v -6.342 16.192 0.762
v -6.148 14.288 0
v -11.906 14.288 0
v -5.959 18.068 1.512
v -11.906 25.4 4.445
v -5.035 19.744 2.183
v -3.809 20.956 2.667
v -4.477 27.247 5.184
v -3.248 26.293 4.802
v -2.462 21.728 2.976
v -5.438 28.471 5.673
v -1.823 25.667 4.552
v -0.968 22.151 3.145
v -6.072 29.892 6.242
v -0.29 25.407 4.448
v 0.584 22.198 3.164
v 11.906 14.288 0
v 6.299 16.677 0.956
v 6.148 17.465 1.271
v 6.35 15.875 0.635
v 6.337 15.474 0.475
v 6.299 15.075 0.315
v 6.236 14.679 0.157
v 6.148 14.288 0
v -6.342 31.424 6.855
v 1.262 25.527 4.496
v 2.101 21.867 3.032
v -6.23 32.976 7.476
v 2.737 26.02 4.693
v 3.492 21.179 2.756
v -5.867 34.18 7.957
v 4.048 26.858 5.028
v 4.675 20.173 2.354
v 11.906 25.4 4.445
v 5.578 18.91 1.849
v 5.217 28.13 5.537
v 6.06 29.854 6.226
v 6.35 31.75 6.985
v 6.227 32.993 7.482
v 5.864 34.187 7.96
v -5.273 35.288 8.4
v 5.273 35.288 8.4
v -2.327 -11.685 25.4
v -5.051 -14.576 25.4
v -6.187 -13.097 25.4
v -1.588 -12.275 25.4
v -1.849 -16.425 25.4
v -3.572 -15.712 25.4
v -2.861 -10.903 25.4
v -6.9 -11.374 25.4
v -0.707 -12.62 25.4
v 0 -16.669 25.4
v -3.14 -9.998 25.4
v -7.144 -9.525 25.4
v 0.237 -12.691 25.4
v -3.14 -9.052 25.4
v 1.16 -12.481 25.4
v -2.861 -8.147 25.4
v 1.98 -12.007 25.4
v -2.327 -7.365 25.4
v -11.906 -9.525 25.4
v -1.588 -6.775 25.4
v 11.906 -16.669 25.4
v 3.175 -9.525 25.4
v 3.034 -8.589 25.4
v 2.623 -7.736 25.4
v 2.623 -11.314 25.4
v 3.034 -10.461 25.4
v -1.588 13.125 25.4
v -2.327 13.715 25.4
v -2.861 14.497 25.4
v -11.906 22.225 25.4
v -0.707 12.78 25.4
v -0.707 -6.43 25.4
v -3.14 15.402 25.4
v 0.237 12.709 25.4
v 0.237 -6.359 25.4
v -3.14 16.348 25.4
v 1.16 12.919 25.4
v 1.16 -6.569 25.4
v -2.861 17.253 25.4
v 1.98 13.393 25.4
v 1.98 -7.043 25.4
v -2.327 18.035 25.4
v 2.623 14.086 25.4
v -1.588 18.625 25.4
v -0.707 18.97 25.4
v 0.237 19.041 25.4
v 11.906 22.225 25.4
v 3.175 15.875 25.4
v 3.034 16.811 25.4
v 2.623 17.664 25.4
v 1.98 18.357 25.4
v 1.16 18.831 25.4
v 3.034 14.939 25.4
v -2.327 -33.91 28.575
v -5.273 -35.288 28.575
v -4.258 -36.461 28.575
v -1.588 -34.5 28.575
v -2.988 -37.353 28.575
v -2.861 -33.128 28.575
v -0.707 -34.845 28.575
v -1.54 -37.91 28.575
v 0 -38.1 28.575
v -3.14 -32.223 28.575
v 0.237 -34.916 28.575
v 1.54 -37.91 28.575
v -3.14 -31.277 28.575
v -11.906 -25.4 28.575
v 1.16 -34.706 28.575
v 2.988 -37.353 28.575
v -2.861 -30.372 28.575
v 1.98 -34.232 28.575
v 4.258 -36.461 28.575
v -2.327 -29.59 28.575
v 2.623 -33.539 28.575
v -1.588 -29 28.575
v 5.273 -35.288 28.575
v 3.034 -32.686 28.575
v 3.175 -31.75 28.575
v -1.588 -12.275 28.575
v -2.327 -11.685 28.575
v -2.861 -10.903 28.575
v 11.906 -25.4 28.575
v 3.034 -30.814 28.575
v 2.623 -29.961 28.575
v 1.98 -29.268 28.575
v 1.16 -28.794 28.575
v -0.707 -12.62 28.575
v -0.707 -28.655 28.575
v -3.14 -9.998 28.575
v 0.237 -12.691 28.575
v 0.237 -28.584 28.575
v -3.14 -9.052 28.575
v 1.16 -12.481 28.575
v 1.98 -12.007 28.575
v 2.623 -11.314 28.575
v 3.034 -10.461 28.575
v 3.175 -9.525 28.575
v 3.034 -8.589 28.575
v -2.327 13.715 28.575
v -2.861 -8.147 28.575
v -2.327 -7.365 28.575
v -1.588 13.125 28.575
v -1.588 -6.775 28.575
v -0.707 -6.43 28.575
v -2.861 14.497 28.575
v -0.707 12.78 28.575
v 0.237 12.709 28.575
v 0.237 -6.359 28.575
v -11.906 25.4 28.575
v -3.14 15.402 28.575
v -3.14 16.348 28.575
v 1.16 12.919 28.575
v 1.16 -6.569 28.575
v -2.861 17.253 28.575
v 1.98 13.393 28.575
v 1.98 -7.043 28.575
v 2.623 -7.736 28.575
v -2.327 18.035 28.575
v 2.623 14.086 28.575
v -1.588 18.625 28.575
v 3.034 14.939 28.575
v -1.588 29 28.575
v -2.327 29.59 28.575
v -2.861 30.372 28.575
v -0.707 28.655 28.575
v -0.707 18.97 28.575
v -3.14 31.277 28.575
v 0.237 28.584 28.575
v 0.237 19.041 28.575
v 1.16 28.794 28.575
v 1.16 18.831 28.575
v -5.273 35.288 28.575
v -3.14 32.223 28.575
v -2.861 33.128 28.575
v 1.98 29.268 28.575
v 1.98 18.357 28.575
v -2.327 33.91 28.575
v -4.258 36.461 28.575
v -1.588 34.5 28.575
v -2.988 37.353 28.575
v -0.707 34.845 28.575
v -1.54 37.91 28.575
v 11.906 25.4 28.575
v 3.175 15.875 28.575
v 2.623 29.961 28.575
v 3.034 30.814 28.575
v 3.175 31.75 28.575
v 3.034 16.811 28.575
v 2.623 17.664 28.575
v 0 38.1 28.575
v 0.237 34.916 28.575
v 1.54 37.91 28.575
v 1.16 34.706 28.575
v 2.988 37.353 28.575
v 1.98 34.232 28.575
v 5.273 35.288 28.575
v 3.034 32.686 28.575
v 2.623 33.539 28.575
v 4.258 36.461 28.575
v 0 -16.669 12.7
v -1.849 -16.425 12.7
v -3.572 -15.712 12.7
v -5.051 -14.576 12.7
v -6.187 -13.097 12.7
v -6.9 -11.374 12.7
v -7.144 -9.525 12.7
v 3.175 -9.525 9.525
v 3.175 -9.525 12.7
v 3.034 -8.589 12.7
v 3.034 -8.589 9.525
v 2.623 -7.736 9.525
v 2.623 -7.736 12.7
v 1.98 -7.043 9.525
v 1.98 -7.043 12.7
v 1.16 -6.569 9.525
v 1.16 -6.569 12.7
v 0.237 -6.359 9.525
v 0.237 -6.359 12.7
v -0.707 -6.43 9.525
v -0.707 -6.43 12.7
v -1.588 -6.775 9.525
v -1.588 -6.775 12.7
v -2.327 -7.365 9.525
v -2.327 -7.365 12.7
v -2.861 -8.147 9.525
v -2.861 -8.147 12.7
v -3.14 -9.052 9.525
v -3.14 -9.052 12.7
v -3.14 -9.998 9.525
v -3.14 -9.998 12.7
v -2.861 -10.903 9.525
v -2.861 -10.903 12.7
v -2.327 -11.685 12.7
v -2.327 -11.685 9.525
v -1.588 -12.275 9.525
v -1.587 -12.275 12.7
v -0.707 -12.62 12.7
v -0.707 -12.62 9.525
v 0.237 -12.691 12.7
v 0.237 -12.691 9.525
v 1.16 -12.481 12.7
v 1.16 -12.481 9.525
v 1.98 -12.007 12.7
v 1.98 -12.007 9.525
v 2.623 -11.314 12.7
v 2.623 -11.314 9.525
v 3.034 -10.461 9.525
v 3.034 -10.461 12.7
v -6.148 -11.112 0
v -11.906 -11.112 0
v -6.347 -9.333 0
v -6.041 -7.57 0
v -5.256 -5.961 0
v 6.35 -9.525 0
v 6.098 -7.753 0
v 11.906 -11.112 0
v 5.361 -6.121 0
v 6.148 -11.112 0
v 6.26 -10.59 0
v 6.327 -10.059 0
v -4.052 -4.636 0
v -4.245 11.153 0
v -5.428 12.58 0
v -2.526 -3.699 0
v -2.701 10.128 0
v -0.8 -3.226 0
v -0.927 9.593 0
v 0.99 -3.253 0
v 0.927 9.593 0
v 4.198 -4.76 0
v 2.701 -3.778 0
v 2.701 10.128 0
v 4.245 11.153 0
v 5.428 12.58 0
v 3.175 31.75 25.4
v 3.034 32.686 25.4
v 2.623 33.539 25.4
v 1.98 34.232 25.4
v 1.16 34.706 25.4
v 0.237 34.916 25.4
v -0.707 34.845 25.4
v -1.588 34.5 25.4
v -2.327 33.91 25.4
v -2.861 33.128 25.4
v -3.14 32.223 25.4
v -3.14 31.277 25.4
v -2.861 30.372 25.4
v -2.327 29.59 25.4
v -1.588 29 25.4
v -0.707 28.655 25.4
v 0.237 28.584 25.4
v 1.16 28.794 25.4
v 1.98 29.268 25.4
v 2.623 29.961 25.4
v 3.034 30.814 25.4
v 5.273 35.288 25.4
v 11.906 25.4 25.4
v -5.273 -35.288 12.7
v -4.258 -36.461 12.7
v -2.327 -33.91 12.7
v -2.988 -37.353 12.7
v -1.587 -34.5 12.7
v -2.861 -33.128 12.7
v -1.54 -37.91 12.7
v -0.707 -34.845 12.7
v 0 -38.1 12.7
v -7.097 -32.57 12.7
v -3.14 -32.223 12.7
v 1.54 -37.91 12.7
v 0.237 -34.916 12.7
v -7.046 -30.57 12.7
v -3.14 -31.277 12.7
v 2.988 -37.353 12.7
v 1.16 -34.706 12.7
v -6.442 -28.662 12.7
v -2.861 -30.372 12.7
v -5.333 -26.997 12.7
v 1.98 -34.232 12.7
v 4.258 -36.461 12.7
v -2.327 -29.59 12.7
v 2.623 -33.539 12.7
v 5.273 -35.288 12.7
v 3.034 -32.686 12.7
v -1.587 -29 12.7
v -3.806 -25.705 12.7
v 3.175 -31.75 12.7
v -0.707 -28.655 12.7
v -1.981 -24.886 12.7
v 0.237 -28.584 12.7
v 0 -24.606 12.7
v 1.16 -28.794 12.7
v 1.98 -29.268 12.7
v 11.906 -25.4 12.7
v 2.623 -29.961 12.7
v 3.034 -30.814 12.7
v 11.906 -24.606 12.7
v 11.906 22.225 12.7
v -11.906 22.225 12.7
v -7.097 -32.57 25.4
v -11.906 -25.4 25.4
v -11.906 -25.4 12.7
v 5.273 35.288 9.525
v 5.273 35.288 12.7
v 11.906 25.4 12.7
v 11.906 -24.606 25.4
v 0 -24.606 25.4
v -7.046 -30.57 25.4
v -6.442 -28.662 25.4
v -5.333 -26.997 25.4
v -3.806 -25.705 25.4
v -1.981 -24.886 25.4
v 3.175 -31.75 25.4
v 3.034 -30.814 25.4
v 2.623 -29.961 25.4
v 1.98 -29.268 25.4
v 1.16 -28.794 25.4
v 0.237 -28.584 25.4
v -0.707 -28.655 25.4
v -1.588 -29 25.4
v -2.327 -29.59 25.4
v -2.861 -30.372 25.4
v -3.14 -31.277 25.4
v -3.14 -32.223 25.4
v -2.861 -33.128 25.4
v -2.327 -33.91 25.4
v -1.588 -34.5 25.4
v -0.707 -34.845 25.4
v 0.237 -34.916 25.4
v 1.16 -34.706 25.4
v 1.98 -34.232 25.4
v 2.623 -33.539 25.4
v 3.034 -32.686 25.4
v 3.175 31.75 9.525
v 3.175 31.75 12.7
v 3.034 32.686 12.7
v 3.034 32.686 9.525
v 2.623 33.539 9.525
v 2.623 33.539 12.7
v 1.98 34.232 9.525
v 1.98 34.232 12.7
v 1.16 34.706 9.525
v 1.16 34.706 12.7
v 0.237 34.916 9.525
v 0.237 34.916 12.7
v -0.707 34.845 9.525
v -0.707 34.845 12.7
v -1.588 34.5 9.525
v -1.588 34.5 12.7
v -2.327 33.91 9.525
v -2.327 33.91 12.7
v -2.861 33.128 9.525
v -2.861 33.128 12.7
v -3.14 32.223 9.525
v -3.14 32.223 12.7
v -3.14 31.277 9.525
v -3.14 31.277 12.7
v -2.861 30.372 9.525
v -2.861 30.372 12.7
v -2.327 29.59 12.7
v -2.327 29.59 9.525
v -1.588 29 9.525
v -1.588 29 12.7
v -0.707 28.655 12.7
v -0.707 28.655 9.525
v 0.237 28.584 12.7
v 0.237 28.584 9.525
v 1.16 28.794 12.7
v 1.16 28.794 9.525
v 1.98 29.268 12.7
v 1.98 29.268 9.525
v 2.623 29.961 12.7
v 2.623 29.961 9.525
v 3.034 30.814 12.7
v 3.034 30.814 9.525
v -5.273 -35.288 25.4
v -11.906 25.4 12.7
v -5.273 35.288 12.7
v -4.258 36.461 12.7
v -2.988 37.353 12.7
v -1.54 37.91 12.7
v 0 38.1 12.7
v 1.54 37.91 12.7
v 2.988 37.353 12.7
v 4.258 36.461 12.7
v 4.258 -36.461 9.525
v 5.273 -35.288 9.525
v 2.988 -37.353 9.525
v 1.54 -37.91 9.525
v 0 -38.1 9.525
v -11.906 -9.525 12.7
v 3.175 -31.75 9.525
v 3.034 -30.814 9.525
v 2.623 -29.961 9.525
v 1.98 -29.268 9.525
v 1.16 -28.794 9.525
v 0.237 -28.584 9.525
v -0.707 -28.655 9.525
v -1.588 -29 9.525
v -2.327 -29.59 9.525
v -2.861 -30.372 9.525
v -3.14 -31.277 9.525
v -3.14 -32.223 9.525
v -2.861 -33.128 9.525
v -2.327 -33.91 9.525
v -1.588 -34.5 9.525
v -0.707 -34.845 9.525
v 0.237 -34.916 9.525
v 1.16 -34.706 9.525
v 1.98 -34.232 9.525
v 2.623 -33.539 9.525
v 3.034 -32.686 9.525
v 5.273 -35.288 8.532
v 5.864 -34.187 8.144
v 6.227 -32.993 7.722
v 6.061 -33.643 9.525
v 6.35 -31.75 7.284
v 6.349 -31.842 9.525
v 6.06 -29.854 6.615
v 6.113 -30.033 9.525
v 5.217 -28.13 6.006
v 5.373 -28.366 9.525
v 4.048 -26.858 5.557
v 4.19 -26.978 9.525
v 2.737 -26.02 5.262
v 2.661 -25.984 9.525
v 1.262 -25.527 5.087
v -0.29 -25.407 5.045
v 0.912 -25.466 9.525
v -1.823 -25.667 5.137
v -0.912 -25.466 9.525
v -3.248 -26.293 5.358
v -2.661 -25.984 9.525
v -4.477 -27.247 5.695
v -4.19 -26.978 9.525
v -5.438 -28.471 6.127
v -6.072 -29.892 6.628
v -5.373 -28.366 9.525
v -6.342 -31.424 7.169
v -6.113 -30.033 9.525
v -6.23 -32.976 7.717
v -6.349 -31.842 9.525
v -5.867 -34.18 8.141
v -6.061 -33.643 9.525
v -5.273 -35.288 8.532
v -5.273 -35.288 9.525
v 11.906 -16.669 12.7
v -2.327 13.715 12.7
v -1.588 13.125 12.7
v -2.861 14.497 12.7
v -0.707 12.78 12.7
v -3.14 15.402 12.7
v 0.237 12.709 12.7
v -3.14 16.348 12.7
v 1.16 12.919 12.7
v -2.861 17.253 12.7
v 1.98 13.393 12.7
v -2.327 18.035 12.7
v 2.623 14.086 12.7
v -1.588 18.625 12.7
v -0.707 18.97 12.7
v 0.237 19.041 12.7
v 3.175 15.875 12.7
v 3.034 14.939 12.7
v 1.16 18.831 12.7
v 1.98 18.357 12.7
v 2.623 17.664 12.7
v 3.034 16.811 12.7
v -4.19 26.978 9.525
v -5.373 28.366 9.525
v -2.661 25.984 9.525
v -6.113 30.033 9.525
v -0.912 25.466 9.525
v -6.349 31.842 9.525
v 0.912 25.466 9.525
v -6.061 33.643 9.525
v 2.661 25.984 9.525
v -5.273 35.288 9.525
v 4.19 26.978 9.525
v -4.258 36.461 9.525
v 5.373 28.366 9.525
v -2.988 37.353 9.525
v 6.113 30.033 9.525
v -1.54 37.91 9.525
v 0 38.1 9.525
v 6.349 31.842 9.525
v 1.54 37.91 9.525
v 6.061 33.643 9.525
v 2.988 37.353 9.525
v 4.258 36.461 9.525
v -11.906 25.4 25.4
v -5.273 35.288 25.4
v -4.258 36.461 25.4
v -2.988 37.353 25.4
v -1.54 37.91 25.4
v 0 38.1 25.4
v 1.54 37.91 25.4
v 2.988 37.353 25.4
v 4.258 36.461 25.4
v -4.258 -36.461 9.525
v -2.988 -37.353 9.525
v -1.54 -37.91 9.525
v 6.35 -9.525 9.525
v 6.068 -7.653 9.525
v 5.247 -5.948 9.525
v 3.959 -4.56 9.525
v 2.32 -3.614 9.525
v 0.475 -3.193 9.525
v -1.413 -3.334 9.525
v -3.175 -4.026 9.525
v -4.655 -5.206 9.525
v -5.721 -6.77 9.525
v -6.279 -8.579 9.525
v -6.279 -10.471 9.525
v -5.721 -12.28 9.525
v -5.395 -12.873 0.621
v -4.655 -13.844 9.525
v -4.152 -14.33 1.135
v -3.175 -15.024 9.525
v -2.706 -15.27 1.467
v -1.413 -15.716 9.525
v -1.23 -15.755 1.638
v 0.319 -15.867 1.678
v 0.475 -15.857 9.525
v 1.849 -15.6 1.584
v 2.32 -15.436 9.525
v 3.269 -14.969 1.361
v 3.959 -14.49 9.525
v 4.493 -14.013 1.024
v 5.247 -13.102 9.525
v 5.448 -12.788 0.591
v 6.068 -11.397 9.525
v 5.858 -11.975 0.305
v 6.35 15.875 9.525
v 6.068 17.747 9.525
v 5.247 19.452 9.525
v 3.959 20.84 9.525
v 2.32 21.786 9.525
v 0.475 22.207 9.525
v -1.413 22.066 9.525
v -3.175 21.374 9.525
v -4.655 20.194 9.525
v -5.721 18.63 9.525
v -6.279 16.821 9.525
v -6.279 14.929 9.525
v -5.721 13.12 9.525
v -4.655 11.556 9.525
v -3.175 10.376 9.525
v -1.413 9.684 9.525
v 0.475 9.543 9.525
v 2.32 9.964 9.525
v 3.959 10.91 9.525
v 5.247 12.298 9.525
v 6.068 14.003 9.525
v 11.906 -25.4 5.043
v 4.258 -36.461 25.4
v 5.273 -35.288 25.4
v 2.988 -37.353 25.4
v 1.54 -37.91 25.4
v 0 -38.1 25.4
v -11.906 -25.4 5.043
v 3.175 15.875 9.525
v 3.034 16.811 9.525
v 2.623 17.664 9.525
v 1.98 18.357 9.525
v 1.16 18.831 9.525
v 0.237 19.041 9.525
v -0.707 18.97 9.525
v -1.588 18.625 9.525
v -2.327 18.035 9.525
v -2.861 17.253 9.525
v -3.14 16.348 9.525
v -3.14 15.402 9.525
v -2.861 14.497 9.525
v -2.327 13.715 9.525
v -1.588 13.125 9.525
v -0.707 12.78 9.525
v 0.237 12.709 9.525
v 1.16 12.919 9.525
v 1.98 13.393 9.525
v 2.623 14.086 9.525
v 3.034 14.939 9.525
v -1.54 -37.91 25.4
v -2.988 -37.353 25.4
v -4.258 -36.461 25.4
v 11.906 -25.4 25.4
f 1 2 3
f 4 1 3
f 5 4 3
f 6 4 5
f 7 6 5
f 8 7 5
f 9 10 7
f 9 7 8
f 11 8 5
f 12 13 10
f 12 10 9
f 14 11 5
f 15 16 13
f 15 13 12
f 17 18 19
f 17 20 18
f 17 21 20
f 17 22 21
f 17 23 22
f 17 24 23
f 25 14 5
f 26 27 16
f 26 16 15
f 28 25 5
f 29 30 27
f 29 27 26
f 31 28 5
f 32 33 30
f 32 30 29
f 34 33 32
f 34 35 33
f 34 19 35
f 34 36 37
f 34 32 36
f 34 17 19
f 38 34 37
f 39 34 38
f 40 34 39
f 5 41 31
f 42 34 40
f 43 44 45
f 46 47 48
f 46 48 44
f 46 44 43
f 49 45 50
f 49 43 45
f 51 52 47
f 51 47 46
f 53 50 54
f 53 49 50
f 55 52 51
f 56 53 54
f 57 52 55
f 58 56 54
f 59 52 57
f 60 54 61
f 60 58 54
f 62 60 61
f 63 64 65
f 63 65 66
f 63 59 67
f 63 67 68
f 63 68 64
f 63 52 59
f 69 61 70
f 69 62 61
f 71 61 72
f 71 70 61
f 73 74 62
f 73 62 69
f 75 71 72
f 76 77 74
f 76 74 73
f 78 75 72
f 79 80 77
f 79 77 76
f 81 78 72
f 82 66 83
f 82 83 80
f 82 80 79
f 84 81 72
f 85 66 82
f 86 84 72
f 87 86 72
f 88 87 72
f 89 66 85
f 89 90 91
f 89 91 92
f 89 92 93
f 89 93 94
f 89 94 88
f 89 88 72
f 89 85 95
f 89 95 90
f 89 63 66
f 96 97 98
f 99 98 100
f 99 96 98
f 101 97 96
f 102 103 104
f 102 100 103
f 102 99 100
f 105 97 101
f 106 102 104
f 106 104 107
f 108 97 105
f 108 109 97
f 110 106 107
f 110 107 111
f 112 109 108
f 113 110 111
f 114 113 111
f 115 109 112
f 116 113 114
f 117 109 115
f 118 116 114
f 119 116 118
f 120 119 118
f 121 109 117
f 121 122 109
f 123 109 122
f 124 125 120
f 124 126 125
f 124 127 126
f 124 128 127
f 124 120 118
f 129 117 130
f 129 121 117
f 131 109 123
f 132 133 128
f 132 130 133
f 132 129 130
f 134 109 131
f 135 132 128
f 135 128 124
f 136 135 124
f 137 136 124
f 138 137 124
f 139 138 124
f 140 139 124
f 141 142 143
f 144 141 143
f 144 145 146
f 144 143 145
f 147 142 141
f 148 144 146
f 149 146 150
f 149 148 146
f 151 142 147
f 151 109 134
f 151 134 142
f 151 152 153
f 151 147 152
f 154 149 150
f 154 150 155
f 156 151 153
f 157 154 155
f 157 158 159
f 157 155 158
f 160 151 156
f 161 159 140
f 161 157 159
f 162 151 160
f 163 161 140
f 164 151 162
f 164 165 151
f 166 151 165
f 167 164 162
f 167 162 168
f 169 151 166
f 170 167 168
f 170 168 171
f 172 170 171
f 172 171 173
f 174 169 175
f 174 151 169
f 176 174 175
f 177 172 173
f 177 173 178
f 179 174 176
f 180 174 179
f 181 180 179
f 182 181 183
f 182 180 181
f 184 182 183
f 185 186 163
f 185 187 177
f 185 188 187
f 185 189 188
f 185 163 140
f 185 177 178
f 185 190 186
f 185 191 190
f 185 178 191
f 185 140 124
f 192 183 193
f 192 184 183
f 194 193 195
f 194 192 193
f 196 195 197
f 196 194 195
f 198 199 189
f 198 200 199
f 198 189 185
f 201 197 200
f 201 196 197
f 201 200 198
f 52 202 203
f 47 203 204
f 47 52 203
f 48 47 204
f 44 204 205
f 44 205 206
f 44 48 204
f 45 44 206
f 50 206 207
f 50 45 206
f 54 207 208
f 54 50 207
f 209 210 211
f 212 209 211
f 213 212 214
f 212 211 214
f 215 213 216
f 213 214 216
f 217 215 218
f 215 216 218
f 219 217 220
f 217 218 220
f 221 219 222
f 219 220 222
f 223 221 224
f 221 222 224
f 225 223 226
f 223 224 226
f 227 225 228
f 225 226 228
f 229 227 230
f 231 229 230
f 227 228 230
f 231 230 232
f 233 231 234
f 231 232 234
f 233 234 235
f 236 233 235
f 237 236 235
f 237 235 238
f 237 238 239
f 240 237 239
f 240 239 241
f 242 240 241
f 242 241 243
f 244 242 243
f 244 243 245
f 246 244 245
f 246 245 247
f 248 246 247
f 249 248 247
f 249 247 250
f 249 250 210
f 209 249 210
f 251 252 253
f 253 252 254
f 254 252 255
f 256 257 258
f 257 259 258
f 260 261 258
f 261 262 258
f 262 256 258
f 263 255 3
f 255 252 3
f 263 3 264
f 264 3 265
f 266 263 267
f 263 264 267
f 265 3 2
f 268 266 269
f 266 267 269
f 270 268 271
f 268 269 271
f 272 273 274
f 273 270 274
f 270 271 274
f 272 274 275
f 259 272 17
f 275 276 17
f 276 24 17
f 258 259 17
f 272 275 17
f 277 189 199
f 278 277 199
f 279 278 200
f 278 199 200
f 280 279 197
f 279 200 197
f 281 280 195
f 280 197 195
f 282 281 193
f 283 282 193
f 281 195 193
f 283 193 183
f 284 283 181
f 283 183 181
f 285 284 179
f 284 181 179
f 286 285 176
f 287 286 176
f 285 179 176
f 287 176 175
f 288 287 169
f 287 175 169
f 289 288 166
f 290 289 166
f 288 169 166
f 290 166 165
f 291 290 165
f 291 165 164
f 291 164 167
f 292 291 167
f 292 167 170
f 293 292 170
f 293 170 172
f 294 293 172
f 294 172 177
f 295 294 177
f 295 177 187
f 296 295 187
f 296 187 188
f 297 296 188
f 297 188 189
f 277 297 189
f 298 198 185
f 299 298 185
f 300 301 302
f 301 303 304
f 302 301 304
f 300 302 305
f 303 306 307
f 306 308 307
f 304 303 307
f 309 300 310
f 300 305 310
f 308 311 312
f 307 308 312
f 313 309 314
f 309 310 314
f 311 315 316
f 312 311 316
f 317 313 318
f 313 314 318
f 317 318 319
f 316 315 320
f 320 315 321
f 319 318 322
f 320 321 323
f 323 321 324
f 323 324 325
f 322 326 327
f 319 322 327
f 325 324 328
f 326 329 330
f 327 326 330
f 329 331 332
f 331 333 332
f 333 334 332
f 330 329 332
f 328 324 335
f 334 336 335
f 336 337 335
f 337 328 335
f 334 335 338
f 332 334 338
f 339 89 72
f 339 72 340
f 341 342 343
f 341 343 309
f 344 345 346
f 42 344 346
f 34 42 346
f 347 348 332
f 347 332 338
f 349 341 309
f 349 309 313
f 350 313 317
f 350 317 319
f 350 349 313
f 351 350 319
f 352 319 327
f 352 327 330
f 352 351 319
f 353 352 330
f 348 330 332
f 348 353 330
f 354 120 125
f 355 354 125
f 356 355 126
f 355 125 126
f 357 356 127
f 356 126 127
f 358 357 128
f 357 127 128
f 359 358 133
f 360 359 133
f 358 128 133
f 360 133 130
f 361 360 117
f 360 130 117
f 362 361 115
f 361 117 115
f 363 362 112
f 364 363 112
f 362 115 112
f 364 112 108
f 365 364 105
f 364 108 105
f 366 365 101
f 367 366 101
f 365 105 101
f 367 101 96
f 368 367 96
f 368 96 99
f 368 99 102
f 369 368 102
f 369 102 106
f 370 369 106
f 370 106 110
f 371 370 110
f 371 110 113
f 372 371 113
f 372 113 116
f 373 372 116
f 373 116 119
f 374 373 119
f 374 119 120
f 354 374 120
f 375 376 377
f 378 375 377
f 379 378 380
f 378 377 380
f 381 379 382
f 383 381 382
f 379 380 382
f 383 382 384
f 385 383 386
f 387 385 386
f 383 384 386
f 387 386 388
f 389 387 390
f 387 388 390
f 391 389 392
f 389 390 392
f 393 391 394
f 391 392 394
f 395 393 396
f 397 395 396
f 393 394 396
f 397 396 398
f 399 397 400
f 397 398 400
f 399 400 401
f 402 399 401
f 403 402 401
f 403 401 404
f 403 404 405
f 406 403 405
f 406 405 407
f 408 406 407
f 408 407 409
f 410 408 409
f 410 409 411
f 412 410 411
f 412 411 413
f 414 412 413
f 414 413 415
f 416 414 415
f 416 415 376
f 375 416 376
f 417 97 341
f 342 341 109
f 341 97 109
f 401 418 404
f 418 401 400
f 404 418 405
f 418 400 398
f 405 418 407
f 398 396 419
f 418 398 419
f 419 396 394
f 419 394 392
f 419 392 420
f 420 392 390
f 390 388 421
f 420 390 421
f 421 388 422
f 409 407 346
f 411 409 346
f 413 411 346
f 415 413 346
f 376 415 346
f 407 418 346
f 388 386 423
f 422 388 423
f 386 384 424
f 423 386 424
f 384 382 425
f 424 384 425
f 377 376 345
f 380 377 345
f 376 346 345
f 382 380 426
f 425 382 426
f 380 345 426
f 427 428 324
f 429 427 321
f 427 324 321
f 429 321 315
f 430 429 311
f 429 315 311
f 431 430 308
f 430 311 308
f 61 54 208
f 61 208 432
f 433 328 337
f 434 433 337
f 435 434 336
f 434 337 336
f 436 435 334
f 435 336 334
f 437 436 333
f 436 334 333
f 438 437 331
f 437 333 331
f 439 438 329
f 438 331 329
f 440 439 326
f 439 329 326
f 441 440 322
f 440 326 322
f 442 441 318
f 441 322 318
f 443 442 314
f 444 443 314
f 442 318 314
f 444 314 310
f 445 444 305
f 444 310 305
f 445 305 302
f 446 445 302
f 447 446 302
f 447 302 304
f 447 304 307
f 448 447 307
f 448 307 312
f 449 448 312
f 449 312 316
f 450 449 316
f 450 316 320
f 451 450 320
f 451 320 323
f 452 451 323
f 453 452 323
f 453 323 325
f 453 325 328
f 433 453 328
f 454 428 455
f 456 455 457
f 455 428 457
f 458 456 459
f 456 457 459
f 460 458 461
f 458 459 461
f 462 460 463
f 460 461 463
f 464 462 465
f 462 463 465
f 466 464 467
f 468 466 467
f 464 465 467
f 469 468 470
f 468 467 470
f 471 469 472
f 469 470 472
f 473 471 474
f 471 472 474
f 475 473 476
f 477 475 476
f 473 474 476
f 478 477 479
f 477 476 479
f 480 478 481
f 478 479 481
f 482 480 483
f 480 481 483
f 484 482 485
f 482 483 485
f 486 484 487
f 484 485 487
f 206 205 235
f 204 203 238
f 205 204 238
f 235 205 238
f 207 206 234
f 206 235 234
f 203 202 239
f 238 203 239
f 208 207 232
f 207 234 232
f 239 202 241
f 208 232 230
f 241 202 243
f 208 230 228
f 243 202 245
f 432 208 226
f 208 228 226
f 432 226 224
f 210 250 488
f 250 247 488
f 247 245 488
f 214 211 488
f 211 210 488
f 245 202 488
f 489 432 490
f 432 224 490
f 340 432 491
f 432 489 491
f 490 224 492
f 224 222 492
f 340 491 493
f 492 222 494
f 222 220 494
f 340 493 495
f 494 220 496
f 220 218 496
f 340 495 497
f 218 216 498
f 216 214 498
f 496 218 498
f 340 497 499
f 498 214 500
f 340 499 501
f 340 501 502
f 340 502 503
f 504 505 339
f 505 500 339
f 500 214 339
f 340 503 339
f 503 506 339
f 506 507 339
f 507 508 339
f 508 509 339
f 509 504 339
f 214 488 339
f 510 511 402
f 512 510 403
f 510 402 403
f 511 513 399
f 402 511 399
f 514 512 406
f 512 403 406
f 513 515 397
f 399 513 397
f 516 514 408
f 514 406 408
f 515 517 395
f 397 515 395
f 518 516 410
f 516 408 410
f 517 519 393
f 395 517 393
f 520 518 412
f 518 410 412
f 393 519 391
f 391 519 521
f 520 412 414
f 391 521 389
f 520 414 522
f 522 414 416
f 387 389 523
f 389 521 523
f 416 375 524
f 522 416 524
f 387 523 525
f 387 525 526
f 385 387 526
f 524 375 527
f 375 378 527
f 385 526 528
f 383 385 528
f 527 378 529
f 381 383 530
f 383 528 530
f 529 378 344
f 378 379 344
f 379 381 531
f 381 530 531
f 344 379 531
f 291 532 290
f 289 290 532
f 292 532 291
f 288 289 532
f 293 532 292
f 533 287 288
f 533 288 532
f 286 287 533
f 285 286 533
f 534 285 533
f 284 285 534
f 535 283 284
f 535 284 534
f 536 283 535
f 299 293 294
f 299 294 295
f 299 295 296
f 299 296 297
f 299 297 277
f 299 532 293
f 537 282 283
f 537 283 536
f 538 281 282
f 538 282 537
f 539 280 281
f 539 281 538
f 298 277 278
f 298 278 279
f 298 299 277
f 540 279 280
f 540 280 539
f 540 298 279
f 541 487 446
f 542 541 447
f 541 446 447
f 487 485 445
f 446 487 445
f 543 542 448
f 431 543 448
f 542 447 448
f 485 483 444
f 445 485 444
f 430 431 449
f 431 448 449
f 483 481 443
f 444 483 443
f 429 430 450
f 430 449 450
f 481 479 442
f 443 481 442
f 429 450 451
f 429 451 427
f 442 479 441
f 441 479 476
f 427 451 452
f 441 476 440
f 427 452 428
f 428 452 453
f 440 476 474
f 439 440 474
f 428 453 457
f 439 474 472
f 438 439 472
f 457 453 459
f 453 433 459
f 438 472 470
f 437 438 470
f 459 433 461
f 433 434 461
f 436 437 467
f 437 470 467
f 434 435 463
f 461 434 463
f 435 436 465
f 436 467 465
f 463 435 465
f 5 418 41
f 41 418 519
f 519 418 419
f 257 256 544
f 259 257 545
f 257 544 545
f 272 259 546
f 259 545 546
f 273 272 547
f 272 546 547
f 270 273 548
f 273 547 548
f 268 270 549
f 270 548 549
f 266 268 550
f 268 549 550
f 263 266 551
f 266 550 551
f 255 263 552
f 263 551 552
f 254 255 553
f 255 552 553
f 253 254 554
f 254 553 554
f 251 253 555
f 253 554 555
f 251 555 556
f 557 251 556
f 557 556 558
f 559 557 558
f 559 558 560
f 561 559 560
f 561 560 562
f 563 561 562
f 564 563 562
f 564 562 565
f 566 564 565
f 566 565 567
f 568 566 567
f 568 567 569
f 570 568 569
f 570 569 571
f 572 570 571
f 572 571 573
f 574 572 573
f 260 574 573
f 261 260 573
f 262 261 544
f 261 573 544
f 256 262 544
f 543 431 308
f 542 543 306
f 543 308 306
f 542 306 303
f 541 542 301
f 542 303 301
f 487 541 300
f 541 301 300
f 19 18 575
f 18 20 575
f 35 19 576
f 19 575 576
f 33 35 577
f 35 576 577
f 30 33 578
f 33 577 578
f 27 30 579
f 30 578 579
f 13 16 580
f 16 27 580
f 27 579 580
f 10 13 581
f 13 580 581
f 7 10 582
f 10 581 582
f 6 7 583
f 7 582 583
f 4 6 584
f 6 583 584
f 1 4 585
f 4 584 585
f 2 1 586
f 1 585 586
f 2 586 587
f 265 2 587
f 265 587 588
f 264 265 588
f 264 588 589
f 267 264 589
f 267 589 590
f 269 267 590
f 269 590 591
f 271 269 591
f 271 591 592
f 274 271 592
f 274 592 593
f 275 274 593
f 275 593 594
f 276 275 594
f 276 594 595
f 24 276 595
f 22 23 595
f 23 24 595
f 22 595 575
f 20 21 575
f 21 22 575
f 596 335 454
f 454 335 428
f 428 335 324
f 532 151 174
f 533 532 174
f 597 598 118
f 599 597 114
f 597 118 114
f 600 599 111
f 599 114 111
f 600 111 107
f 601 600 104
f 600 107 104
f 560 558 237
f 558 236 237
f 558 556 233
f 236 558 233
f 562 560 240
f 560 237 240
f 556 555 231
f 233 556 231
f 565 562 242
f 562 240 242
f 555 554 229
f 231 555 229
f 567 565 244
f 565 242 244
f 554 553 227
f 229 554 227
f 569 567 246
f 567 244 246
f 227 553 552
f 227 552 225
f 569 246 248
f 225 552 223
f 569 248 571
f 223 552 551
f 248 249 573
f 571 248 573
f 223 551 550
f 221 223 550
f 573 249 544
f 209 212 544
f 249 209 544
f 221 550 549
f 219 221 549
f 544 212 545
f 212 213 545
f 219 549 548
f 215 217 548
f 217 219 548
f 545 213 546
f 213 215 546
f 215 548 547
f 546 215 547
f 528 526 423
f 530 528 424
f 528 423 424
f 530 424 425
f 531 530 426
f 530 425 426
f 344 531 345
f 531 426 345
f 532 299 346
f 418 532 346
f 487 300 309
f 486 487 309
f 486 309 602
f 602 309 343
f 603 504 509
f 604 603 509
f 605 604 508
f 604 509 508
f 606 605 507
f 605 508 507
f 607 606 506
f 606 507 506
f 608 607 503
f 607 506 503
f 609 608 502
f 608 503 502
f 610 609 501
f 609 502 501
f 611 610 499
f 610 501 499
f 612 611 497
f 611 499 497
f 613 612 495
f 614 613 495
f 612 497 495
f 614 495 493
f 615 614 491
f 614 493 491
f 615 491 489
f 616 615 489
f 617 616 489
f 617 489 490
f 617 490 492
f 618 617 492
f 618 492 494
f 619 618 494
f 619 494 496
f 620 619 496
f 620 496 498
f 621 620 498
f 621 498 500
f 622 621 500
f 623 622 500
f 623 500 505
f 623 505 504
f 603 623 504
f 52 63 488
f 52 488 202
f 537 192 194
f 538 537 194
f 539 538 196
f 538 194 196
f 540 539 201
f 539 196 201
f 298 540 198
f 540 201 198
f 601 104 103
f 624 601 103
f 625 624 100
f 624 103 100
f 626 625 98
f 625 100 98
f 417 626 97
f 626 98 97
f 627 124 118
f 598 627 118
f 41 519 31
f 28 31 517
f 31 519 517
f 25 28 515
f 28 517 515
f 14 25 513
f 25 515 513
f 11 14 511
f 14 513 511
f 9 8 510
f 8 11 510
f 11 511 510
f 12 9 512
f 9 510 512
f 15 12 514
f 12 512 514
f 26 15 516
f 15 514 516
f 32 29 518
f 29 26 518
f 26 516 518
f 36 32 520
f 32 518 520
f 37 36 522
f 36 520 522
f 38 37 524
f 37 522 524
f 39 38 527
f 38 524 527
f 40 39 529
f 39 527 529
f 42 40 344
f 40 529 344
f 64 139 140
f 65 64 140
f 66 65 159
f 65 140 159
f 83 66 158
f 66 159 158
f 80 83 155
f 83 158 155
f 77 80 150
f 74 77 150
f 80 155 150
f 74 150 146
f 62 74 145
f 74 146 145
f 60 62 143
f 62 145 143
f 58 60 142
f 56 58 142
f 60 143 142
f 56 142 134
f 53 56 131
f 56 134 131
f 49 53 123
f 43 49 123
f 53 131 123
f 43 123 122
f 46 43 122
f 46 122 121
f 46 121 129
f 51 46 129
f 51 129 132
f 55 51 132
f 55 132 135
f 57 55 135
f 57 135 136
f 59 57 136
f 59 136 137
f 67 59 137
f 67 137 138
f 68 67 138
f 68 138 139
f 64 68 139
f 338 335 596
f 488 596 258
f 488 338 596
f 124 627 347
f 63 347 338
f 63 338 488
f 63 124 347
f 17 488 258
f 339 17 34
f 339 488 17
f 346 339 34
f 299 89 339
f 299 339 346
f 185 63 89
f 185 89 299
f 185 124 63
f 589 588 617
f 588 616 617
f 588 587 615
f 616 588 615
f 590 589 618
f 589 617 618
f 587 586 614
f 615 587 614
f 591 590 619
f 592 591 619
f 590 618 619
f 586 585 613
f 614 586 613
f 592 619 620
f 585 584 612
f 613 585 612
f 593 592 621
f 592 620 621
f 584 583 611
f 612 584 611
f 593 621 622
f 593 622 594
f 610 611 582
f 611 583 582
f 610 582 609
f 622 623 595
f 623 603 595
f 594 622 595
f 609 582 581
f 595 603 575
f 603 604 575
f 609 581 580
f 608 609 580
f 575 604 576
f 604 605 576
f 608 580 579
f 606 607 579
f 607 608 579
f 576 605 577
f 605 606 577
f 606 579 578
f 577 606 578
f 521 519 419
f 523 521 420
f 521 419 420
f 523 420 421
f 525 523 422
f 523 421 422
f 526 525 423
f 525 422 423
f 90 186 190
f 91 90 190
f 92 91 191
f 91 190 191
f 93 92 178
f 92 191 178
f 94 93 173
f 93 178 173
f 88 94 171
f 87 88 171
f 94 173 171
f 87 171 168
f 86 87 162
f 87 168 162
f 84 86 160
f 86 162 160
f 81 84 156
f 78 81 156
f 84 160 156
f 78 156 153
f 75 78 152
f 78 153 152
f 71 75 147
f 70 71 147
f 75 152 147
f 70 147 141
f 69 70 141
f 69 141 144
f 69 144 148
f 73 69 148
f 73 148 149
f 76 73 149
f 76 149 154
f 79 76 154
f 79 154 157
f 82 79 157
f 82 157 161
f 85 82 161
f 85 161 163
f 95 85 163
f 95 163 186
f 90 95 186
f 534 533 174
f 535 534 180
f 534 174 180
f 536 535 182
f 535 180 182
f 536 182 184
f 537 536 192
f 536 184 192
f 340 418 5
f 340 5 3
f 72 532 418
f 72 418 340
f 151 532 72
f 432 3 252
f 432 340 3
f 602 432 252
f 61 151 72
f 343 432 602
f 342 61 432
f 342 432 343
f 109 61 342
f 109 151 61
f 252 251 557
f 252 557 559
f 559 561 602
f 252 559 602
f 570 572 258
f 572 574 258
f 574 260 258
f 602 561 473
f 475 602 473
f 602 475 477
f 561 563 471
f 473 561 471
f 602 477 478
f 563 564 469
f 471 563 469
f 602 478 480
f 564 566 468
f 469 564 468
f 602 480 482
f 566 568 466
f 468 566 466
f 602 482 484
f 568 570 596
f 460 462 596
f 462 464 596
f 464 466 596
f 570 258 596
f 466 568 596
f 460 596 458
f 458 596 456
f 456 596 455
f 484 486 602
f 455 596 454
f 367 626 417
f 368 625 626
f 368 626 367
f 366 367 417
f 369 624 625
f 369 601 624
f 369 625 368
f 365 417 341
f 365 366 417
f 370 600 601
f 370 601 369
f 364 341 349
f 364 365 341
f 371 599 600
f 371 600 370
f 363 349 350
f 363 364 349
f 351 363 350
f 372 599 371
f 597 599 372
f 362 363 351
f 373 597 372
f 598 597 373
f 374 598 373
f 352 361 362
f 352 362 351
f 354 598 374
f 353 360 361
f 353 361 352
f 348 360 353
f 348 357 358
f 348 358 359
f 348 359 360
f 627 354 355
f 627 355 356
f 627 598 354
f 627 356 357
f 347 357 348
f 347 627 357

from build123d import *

# Parameters (mm, degrees)
SKETCH1_W               = 23.8125
SKETCH1_H               = 76.2
BOSS_EXTRUDE1_DEPTH     = 28.575
SKETCH2_R               = 3.175
CUT_EXTRUDE1_DEPTH      = 31.75
SKETCH11_W              = 12.7
SKETCH11_H              = 12.7
SKETCH11_H_2            = 60.325
CUT_EXTRUDE7_DEPTH      = 12.90625
CUT_EXTRUDE7_DEPTH_BACK = 12.90625
BOSS_EXTRUDE3_DEPTH     = 12.7
CUT_EXTRUDE8_START      = -3.175
SKETCH13_R              = 6.35
CUT_EXTRUDE8_DEPTH      = 10.525


with BuildPart() as part:
    # Sketch1 → Boss-Extrude1 (new body)
    with BuildSketch(Plane.XY):
        Rectangle(SKETCH1_W, SKETCH1_H)
    extrude(amount=BOSS_EXTRUDE1_DEPTH)

    # Sketch2 → Cut-Extrude1 (cut)
    with BuildSketch(Plane.XY.offset(28.575)):
        with BuildLine():
            Line((-11.90625, -38.1), (0, -38.1))
            ThreePointArc((0, -38.1), (-2.988235294, -37.352941176), (-5.273356401, -35.287543253))
            Line((-5.273356401, -35.287543253), (-11.90625, -25.4))
            Line((-11.90625, -25.4), (-11.90625, -38.1))
        make_face()
        with BuildLine():
            Line((11.90625, -38.1), (11.90625, -25.4))
            Line((11.90625, -25.4), (5.273356401, -35.287543253))
            ThreePointArc((5.273356401, -35.287543253), (2.988235294, -37.352941176), (0, -38.1))
            Line((0, -38.1), (11.90625, -38.1))
        make_face()
        with BuildLine():
            ThreePointArc((0, 38.1), (2.988235294, 37.352941176), (5.273356401, 35.287543253))
            Line((5.273356401, 35.287543253), (11.90625, 25.4))
            Line((11.90625, 25.4), (11.90625, 38.1))
            Line((11.90625, 38.1), (0, 38.1))
        make_face()
        with BuildLine():
            ThreePointArc((-5.273356401, 35.287543253), (-2.988235294, 37.352941176), (0, 38.1))
            Line((0, 38.1), (-11.90625, 38.1))
            Line((-11.90625, 38.1), (-11.90625, 25.4))
            Line((-11.90625, 25.4), (-5.273356401, 35.287543253))
        make_face()
        with Locations((0, 31.75)):
            Circle(SKETCH2_R)
        with Locations((0, 15.875)):
            Circle(SKETCH2_R)
        with Locations((0, -9.525)):
            Circle(SKETCH2_R)
        with Locations((0, -31.75)):
            Circle(SKETCH2_R)
    extrude(amount=-CUT_EXTRUDE1_DEPTH, mode=Mode.SUBTRACT)

    # Sketch11 → Cut-Extrude7 (cut, two sides)
    with BuildSketch(Plane(origin=(0, 0, 0), x_dir=(0, 0, -1), z_dir=(1, 0, 0))) as cut_extrude7_sk:
        with Locations((-19.05, 31.75)):
            Rectangle(SKETCH11_W, SKETCH11_H)
        with Locations((-19.05, -7.9375)):
            Rectangle(SKETCH11_W, SKETCH11_H_2)
        Polygon((0, 14.2875), (-9.525, 38.1), (0, 38.1), align=None)
        Polygon((0, -11.1125), (-9.525, -38.1), (0, -38.1), align=None)
    extrude(amount=CUT_EXTRUDE7_DEPTH, mode=Mode.SUBTRACT)
    extrude(cut_extrude7_sk.sketch, amount=-CUT_EXTRUDE7_DEPTH_BACK, mode=Mode.SUBTRACT)

    # Sketch12 → Boss-Extrude3 (add)
    with BuildSketch(Plane(origin=(0, 0, 25.4), x_dir=(-1, 0, 0), z_dir=(0, 0, -1))):
        with BuildLine():
            Line((0, -24.60625), (-11.90625, -24.60625))
            Line((-11.90625, -24.60625), (-11.90625, -16.66875))
            Line((-11.90625, -16.66875), (0, -16.66875))
            ThreePointArc((0, -16.66875), (5.051394068, -14.576394068), (7.14375, -9.525))
            Line((7.14375, -9.525), (11.90625, -9.525))
            Line((11.90625, -9.525), (11.90625, -25.4))
            Line((11.90625, -25.4), (7.096564462, -32.569717572))
            ThreePointArc((7.096564462, -32.569717572), (5.333339548, -26.997247815), (0, -24.60625))
        make_face()
    extrude(amount=BOSS_EXTRUDE3_DEPTH)

    # Sketch13 → Cut-Extrude8 (cut, through all)
    with BuildSketch(Plane.XY.offset(12.7).offset(CUT_EXTRUDE8_START)):
        with Locations((0, 31.75)):
            Circle(SKETCH13_R)
        with Locations((0, 15.875)):
            Circle(SKETCH13_R)
        with Locations((0, -9.525)):
            Circle(SKETCH13_R)
        with Locations((0, -31.75)):
            Circle(SKETCH13_R)
    extrude(amount=-CUT_EXTRUDE8_DEPTH, mode=Mode.SUBTRACT)


solid = part.part
